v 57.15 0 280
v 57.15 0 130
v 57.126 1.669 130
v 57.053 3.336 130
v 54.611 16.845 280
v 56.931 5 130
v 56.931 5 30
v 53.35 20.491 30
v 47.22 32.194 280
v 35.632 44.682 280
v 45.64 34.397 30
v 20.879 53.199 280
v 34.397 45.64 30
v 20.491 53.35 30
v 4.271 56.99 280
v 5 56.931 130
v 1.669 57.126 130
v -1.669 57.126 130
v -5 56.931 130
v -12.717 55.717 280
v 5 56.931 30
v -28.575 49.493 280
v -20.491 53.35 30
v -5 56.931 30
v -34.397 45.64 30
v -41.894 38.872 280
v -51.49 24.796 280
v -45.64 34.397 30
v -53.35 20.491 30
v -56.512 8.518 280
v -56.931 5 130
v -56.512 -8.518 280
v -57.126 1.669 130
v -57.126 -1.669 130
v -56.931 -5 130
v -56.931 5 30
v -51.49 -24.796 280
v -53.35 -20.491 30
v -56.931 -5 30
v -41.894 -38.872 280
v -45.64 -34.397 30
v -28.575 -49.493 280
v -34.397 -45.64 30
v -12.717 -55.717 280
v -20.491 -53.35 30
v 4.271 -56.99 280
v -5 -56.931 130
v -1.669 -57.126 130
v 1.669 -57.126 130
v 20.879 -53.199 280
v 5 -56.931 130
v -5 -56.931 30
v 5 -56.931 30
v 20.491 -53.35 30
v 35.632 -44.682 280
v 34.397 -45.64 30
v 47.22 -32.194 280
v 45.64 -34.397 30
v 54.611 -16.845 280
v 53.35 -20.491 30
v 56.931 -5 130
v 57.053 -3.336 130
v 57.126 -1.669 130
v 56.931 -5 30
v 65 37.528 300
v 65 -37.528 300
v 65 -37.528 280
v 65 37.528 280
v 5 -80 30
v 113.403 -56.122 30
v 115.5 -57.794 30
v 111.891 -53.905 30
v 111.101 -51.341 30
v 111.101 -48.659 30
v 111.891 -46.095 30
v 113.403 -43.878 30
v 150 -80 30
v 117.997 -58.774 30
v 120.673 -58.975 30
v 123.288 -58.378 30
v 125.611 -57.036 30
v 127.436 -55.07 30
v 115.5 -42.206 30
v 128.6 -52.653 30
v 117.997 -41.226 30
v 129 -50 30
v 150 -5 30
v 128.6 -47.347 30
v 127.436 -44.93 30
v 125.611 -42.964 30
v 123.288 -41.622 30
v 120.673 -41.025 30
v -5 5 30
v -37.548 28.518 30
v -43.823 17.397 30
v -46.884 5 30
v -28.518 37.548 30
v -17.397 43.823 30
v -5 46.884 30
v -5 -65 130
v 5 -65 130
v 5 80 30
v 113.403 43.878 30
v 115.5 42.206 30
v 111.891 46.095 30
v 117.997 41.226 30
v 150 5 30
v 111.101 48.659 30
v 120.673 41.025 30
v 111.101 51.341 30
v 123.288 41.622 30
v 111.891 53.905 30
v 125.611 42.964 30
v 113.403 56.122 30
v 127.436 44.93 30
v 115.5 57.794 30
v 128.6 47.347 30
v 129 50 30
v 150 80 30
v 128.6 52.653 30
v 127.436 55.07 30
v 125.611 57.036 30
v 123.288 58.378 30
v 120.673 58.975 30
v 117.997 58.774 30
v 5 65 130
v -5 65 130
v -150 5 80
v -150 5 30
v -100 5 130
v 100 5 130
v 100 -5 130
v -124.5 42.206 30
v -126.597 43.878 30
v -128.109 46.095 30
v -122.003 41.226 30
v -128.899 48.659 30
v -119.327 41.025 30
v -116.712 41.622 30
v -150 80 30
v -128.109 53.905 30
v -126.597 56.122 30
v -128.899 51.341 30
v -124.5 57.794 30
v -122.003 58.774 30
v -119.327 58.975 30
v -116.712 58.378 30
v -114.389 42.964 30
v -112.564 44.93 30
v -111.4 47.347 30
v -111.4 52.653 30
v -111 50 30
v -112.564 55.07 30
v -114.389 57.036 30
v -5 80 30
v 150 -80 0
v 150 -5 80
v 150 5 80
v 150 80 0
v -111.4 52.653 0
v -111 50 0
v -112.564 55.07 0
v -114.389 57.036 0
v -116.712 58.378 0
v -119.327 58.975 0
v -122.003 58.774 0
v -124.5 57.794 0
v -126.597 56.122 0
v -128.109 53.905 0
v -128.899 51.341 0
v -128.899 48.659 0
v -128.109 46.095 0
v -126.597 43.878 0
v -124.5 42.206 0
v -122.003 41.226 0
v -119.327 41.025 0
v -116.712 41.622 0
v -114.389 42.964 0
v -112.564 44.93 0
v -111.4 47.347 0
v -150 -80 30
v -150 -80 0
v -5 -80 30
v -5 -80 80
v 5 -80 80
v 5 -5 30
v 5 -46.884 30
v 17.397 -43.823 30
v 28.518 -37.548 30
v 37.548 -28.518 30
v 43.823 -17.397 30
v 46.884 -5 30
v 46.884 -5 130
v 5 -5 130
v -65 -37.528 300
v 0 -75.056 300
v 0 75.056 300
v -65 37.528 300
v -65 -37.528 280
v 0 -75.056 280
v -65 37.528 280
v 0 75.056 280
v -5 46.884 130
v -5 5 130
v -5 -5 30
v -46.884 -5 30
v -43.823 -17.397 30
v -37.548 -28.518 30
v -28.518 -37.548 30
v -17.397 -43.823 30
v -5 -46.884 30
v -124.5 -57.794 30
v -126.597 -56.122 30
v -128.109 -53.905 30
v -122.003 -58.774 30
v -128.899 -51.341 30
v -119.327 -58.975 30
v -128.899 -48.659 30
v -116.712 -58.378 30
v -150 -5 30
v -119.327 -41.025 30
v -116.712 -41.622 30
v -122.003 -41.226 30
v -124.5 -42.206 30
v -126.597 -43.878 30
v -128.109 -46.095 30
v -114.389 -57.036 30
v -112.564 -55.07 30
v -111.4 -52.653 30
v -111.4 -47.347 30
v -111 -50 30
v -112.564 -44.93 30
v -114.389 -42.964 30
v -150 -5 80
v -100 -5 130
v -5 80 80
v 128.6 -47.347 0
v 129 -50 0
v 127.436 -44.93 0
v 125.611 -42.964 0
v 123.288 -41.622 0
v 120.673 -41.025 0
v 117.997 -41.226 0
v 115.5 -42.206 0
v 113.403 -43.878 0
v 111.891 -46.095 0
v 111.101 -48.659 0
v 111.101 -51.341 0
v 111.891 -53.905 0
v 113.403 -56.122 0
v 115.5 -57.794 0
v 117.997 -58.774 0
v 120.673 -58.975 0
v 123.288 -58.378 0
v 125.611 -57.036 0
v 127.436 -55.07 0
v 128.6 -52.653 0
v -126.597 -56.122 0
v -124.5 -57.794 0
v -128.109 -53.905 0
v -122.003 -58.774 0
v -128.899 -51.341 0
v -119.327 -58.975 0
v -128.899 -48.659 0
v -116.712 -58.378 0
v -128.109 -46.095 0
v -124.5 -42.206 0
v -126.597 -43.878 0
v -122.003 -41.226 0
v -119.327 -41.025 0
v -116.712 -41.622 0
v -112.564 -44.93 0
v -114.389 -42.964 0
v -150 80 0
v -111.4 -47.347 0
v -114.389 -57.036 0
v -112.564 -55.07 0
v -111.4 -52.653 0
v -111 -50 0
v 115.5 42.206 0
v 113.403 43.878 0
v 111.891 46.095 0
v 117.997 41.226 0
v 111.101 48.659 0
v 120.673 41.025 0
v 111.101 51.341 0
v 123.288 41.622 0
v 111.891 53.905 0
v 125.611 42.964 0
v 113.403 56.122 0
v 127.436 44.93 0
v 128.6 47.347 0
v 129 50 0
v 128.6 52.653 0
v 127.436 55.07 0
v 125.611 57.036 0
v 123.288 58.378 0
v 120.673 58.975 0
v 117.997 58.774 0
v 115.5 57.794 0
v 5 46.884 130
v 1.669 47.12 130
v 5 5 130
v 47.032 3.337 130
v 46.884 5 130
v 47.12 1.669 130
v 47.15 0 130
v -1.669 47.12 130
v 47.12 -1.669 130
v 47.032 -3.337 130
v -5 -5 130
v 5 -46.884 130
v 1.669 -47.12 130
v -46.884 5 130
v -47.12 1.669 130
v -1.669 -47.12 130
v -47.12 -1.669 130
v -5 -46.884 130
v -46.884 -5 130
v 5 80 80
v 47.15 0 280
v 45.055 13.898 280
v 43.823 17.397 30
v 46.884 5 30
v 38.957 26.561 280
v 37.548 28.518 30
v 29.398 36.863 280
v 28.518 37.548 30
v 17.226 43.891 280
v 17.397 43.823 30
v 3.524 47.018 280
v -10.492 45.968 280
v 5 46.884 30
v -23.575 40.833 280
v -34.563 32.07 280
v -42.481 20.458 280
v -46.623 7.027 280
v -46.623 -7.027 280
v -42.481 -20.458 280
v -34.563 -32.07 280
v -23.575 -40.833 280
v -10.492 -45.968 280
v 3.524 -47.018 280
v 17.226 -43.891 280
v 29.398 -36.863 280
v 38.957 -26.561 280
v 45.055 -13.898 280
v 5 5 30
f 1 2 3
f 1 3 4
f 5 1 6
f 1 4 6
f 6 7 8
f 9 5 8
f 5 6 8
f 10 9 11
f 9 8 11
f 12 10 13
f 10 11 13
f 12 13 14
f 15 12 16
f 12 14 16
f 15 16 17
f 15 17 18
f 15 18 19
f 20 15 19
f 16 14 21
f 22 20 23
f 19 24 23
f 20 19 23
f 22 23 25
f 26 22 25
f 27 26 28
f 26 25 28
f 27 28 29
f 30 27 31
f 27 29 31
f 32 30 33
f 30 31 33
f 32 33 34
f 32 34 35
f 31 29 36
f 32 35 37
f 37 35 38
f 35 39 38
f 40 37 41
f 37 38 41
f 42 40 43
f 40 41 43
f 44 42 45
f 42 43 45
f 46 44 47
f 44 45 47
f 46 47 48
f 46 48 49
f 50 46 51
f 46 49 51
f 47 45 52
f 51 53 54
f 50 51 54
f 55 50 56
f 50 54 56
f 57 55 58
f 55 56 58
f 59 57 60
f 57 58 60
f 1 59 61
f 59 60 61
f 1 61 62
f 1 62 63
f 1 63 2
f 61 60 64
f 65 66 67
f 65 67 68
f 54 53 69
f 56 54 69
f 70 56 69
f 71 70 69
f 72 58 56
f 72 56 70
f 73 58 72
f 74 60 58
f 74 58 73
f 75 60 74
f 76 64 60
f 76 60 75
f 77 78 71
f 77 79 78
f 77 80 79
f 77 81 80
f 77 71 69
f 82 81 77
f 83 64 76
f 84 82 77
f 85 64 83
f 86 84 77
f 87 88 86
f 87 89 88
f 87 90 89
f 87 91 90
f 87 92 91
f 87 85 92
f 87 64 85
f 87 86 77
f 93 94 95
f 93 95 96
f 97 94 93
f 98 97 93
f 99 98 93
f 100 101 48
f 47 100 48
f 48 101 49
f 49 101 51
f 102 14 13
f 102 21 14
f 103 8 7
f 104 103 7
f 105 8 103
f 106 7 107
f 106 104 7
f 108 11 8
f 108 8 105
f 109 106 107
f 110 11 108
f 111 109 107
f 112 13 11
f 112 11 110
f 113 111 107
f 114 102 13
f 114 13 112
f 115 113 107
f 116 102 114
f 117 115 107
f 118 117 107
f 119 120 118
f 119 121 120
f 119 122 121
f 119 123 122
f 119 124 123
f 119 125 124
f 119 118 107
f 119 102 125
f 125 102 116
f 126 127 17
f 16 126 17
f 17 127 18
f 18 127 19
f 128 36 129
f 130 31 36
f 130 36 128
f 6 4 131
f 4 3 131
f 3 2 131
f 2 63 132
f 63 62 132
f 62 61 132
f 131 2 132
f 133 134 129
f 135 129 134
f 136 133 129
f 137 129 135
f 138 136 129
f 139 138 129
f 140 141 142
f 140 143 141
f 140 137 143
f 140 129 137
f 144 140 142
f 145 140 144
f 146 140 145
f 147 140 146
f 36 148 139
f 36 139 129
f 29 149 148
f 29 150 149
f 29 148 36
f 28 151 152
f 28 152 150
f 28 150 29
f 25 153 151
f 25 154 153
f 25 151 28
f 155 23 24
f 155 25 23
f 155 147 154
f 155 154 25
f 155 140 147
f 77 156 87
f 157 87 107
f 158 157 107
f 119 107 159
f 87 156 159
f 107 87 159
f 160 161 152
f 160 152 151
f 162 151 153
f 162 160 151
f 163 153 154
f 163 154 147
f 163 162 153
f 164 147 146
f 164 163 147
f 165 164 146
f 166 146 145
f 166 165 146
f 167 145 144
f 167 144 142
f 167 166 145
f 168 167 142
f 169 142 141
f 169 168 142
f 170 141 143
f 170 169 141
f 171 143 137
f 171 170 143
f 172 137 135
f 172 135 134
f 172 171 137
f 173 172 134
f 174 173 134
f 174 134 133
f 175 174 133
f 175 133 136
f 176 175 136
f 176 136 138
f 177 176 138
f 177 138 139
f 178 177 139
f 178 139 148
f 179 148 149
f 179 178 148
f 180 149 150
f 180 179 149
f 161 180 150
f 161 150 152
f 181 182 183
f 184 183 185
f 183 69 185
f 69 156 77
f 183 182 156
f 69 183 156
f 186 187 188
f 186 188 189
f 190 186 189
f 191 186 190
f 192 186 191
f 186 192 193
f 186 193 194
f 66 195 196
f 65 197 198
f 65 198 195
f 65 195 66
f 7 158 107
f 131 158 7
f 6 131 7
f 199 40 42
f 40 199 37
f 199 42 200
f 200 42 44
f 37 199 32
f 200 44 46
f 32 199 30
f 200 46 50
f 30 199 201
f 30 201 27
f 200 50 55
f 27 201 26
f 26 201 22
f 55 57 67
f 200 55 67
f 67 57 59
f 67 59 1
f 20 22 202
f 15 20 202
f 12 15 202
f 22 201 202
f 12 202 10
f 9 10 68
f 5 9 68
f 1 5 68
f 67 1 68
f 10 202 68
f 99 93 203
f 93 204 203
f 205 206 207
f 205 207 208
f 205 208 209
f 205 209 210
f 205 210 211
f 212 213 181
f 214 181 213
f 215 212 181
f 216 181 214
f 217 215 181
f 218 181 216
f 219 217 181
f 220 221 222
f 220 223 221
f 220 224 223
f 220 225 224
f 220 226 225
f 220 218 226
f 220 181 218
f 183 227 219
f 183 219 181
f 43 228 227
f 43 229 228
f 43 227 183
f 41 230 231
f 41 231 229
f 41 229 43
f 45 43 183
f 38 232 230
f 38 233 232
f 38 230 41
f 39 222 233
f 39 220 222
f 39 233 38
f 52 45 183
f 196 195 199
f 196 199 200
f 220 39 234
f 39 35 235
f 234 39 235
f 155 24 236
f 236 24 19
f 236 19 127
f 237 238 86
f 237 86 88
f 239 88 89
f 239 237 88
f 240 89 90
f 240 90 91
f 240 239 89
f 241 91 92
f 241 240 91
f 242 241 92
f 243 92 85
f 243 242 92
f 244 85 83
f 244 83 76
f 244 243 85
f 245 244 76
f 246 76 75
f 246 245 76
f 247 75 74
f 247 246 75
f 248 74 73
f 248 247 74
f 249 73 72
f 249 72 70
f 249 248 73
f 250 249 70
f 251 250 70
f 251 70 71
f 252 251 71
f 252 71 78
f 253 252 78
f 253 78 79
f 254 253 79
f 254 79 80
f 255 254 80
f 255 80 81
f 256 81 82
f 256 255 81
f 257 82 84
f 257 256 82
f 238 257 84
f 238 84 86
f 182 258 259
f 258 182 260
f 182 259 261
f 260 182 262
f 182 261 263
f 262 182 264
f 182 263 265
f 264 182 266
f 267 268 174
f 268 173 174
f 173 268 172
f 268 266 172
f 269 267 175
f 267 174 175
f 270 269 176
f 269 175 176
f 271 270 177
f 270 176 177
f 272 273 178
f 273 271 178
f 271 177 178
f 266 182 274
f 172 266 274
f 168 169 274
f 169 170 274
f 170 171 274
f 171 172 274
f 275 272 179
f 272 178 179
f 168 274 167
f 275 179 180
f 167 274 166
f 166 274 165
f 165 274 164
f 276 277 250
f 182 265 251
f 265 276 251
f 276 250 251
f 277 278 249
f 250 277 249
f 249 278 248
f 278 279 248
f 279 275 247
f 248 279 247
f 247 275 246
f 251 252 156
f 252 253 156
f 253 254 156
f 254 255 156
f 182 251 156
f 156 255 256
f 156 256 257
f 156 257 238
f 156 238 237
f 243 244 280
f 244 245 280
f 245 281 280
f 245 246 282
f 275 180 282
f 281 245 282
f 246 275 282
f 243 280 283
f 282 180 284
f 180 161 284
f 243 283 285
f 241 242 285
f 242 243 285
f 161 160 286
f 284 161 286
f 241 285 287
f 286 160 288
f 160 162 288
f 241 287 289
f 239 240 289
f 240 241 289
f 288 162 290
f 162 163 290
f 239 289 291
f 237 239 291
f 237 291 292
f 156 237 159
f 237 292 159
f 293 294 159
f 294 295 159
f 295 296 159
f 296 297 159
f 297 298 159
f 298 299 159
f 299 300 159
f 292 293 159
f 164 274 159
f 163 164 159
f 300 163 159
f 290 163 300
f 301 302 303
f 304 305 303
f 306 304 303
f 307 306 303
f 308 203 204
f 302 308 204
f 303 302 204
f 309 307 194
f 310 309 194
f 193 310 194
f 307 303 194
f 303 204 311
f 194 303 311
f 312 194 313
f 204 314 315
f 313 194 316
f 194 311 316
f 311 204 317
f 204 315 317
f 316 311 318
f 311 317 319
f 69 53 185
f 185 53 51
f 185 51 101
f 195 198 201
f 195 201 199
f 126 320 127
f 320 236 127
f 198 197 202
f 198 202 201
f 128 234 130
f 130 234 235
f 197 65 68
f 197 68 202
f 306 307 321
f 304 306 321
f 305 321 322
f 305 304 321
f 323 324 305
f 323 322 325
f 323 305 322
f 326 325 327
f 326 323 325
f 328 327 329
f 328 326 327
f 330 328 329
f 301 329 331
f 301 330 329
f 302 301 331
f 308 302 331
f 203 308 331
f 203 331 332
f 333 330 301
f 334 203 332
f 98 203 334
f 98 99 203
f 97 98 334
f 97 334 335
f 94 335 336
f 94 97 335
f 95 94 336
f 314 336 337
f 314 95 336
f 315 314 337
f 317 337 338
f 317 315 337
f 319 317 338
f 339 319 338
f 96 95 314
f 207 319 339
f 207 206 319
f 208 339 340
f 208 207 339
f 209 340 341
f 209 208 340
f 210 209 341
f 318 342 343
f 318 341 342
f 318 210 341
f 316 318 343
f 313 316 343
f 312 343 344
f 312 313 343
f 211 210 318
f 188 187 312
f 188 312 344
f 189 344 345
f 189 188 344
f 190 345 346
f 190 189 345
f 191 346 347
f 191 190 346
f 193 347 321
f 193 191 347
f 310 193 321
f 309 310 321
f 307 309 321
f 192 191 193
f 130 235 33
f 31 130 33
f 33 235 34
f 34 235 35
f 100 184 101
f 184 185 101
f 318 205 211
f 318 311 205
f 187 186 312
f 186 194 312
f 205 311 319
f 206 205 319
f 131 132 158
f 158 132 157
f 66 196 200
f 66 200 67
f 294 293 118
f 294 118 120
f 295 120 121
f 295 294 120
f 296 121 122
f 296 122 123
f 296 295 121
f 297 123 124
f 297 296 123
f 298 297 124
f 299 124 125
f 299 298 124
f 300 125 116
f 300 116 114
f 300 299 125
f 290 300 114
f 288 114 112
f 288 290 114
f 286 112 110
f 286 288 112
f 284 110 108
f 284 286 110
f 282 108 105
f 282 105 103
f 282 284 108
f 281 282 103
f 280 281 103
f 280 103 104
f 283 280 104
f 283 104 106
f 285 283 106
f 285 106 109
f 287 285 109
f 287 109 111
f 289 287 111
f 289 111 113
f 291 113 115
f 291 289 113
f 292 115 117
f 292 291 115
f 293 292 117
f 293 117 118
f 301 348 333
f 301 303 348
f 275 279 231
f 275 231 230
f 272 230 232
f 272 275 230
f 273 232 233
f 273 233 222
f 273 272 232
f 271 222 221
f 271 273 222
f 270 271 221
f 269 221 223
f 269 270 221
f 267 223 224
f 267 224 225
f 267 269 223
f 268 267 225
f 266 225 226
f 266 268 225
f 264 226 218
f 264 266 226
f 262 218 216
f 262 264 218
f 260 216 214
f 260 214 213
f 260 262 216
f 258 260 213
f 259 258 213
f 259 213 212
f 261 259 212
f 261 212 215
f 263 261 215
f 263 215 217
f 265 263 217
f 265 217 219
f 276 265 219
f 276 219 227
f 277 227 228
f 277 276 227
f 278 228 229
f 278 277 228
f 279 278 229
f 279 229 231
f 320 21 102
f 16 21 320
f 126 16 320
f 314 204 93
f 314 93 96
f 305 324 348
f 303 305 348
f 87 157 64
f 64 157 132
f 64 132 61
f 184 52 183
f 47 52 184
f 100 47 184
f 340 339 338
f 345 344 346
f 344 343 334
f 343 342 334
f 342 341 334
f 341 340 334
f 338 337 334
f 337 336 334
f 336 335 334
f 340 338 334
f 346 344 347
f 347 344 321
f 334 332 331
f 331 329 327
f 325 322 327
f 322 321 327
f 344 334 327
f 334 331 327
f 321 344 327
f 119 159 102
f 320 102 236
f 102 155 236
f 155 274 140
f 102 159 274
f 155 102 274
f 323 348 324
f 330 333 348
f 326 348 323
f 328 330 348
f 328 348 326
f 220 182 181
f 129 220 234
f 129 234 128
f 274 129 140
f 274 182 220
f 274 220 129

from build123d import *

# Parameters (mm, degrees)
EXTRUDE004_DEPTH      = 20
EXTRUDE001_DEPTH      = 5
SKETCH002_R           = 57.15
SKETCH002_R_2         = 47.15
EXTRUDE002_DEPTH      = 270
EXTRUDE003_DEPTH      = 5
CLONE_PLACEMENT_ANGLE = 180
SKETCH_W              = 300
SKETCH_H              = 160
SKETCH_R              = 9
EXTRUDE_DEPTH         = 30


with BuildPart() as lastplatte:
    # Sketch004 (on Face26 of Fusion) → Extrude004 (new body)
    with BuildSketch(Plane.XY.offset(300)):
        Polygon((65, 37.527767), (0, 75.055535), (-65, 37.527767), (-65, -37.527767), (0, -75.055535), (65, -37.527767), align=None)
    extrude(amount=-EXTRUDE004_DEPTH)


with BuildPart() as steife1:
    # Sketch001 → Extrude001 (new body, symmetric)
    with BuildSketch(Plane.XZ):
        Polygon((150, 30), (-150, 30), (-150, 80), (-100, 130), (100, 130), (150, 80), align=None)
    extrude(amount=EXTRUDE001_DEPTH, both=True)


with BuildPart() as r114x10:
    # Sketch002 (on Face10 of Extrude) → Extrude002 (new body)
    with BuildSketch(Plane.XY.offset(30)):
        Circle(SKETCH002_R)
        Circle(SKETCH002_R_2, mode=Mode.SUBTRACT)
    extrude(amount=EXTRUDE002_DEPTH)


with BuildPart() as steife2:
    # Sketch003 → Extrude003 (new body, symmetric)
    with BuildSketch(Plane.YZ):
        Polygon((-80, 30), (-80, 80), (-65, 130), (-5, 130), (-5, 30), align=None)
    extrude(amount=EXTRUDE003_DEPTH, both=True)


with BuildPart() as steife003:
    # Clone base: copy of steife2
    add(steife2.part)


with BuildPart() as steife003_1:
    # Clone placement: moved
    add(steife003.part.rotate(Axis((0, 0, 0), (0, 0, 1)), CLONE_PLACEMENT_ANGLE))


with BuildPart() as fusion001:
    # Sketch → Extrude (new body)
    with BuildSketch(Plane.XY):
        Rectangle(SKETCH_W, SKETCH_H)
        with Locations((-120, 50)):
            Circle(SKETCH_R, mode=Mode.SUBTRACT)
        with Locations((120, 50)):
            Circle(SKETCH_R, mode=Mode.SUBTRACT)
        with Locations((120, -50)):
            Circle(SKETCH_R, mode=Mode.SUBTRACT)
        with Locations((-120, -50)):
            Circle(SKETCH_R, mode=Mode.SUBTRACT)
    extrude(amount=EXTRUDE_DEPTH)

    # Fusion: union steife1, R114x10, steife2, steife003
    add(steife1.part)
    add(r114x10.part)
    add(steife2.part)
    add(steife003_1.part)

    # Fusion001: union lastplatte
    add(lastplatte.part)


solid = fusion001.part
